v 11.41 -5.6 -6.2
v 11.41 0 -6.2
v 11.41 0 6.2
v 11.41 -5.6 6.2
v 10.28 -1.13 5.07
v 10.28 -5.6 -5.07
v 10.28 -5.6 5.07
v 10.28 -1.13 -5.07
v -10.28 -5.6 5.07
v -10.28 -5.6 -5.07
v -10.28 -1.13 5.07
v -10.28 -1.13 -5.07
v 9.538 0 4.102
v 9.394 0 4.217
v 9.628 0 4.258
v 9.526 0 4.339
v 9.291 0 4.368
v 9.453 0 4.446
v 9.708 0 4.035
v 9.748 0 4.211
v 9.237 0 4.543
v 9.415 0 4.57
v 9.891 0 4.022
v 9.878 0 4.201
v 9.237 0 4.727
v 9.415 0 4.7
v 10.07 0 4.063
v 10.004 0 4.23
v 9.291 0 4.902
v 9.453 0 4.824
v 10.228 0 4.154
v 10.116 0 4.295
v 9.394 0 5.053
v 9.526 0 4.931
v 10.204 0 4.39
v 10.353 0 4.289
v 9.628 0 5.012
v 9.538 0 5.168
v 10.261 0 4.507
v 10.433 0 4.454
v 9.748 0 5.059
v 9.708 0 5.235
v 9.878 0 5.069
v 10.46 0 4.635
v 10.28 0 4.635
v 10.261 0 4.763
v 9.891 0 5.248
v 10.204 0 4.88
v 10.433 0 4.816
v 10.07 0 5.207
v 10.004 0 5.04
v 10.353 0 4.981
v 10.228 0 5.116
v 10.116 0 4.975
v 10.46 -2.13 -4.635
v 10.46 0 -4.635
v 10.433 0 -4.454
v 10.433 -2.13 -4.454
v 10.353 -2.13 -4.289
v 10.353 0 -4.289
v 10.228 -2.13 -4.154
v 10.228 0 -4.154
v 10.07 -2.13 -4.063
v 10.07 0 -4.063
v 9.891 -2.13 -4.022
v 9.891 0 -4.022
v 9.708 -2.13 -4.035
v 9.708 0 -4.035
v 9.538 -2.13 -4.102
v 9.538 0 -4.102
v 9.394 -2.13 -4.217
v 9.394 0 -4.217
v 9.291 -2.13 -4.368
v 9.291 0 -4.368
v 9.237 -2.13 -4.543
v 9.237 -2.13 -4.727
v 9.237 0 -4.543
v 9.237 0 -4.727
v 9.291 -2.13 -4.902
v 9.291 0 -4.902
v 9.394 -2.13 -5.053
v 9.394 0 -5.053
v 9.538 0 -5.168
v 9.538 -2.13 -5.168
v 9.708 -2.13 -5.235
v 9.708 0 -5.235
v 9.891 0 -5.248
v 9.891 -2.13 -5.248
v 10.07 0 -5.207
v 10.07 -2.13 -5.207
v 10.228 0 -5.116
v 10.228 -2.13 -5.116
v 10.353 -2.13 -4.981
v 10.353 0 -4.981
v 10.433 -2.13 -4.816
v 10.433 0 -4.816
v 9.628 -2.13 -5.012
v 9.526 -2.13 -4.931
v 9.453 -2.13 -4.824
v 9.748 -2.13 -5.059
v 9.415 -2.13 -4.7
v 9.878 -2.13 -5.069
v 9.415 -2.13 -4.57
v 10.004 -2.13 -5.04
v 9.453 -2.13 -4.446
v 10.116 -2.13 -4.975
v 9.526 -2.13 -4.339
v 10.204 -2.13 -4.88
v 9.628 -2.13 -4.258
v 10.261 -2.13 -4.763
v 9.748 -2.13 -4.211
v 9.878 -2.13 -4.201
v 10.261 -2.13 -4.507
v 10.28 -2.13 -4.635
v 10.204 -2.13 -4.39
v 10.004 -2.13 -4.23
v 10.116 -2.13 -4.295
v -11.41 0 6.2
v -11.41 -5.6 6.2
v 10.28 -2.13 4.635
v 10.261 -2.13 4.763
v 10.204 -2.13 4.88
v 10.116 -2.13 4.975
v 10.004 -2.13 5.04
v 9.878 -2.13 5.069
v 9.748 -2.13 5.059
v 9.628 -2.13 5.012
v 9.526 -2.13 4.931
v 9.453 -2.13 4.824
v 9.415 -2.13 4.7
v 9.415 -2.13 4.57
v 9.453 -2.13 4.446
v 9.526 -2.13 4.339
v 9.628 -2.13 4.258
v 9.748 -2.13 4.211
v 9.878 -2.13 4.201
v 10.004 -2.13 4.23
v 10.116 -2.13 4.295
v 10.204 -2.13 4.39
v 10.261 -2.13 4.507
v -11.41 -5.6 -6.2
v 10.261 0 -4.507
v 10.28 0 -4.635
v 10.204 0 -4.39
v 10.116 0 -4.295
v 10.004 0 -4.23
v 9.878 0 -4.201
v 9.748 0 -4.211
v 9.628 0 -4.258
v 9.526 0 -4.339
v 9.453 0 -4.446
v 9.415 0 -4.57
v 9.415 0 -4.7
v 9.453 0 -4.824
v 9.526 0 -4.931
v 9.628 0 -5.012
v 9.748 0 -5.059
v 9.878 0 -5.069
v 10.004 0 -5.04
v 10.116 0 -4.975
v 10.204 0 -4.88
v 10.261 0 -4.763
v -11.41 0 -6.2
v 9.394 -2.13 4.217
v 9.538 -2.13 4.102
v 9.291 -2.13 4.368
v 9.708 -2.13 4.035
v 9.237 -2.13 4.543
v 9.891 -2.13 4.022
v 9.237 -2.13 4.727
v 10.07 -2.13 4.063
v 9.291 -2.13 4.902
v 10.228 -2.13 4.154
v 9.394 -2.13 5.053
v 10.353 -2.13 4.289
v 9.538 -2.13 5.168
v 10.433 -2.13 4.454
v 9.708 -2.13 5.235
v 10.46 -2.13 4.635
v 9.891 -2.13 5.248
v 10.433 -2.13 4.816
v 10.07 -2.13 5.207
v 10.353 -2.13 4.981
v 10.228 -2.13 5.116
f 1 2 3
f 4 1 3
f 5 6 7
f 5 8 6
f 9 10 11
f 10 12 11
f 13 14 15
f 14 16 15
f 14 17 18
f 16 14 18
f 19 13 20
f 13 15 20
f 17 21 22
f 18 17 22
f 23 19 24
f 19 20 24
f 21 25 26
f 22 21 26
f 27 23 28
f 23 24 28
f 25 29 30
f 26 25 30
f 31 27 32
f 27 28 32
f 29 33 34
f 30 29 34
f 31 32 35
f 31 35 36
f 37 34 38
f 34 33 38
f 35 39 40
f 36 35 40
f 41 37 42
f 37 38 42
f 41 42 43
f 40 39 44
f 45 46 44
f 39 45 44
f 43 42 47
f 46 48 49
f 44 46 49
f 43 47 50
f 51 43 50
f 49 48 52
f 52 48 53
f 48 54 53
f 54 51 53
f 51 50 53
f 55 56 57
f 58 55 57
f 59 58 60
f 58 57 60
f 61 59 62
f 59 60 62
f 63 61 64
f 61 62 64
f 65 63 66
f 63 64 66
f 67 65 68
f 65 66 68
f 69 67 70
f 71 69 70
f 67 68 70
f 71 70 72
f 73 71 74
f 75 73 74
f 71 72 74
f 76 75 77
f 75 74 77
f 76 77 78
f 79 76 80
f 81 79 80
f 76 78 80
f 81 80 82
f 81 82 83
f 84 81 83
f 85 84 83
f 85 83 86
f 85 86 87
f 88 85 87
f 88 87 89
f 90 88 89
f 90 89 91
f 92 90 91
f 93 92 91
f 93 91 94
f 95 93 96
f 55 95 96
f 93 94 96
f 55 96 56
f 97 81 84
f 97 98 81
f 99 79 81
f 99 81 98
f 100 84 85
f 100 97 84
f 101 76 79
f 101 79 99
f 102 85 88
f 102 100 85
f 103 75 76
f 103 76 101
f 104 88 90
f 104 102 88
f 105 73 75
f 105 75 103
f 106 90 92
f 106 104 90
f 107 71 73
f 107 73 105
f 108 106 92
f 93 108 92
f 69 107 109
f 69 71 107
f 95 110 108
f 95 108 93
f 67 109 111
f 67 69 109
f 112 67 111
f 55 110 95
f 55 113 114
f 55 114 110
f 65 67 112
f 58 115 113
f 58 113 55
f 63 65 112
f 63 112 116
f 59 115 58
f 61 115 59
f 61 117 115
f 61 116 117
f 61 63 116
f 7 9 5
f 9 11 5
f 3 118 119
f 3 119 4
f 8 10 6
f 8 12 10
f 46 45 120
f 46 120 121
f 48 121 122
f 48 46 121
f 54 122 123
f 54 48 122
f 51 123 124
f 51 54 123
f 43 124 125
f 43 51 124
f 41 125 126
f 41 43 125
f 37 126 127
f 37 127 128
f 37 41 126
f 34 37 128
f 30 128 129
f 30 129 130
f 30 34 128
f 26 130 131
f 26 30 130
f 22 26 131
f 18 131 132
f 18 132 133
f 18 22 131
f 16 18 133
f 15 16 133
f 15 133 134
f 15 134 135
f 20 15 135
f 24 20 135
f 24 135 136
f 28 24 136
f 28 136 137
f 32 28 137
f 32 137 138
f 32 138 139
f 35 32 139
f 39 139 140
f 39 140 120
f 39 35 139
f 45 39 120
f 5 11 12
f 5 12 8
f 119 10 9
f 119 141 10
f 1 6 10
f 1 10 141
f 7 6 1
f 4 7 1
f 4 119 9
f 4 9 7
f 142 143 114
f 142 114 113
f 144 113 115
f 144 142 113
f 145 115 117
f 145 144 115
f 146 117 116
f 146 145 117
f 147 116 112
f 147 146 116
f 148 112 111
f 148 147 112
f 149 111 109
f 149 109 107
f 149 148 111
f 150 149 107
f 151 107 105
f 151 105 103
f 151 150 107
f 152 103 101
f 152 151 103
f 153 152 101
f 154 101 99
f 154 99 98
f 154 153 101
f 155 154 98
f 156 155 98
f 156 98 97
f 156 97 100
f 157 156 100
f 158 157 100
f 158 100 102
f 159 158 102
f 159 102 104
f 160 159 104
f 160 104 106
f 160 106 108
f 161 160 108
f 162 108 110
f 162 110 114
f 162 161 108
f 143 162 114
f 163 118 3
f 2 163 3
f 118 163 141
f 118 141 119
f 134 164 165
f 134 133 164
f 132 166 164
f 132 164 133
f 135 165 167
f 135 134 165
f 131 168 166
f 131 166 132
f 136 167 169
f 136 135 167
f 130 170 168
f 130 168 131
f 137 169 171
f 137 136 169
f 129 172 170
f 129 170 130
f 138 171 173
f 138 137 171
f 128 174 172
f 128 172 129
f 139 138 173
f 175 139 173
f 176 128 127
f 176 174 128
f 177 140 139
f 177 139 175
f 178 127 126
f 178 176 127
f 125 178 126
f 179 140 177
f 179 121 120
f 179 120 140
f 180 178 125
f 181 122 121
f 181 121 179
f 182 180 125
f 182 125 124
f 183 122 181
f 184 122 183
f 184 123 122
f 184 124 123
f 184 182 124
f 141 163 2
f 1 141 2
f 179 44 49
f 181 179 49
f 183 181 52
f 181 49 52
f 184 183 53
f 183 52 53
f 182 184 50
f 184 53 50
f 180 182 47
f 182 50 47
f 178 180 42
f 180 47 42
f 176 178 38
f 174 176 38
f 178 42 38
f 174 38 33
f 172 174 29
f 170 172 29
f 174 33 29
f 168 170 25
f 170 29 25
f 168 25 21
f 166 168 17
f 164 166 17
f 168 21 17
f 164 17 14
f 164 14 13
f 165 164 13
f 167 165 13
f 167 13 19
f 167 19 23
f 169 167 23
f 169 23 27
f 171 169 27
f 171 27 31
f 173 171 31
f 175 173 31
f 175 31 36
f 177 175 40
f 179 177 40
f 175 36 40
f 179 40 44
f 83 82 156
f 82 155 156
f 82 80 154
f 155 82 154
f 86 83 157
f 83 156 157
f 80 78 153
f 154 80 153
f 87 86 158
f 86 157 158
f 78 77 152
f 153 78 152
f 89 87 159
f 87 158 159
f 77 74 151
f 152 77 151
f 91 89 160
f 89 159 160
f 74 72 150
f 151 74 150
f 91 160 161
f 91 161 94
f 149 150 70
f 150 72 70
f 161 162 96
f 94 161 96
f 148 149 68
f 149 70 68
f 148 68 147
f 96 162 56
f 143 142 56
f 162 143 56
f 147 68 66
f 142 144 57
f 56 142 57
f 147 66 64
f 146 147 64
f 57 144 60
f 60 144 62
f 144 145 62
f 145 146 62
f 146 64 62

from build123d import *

# Parameters (mm, degrees)
F0_W     = 22.82
F0_H     = 12.4
F1_DEPTH = 5.6
F2_T     = -1.13
F3_R     = 0.615
F3_R_2   = 0.435
F5_DEPTH = 2.13
F4_R     = 0.615
F4_R_2   = 0.435
F6_DEPTH = 2.13


with BuildPart() as f1:
    # F0 (on Front) → F1 (new body)
    with BuildSketch(Plane.XZ):
        Rectangle(F0_W, F0_H)
    extrude(amount=F1_DEPTH)

    # F2
    f2_openings = [f1.faces().sort_by_distance(p)[0] for p in [
        (0, -5.6, 0),
    ]]
    offset(amount=F2_T, openings=f2_openings)


with BuildPart() as f5:
    # F3 (on Front) → F5 (new body)
    with BuildSketch(Plane.XZ):
        with Locations((9.845, 4.635)):
            Circle(F3_R)
        with Locations((9.845, 4.635)):
            Circle(F3_R_2, mode=Mode.SUBTRACT)
    extrude(amount=F5_DEPTH)


with BuildPart() as f6:
    # F4 (on Front) → F6 (new body)
    with BuildSketch(Plane.XZ):
        with Locations((9.845, -4.635)):
            Circle(F4_R)
        with Locations((9.845, -4.635)):
            Circle(F4_R_2, mode=Mode.SUBTRACT)
    extrude(amount=F6_DEPTH)


solid = Compound([f1.part, f5.part, f6.part])
